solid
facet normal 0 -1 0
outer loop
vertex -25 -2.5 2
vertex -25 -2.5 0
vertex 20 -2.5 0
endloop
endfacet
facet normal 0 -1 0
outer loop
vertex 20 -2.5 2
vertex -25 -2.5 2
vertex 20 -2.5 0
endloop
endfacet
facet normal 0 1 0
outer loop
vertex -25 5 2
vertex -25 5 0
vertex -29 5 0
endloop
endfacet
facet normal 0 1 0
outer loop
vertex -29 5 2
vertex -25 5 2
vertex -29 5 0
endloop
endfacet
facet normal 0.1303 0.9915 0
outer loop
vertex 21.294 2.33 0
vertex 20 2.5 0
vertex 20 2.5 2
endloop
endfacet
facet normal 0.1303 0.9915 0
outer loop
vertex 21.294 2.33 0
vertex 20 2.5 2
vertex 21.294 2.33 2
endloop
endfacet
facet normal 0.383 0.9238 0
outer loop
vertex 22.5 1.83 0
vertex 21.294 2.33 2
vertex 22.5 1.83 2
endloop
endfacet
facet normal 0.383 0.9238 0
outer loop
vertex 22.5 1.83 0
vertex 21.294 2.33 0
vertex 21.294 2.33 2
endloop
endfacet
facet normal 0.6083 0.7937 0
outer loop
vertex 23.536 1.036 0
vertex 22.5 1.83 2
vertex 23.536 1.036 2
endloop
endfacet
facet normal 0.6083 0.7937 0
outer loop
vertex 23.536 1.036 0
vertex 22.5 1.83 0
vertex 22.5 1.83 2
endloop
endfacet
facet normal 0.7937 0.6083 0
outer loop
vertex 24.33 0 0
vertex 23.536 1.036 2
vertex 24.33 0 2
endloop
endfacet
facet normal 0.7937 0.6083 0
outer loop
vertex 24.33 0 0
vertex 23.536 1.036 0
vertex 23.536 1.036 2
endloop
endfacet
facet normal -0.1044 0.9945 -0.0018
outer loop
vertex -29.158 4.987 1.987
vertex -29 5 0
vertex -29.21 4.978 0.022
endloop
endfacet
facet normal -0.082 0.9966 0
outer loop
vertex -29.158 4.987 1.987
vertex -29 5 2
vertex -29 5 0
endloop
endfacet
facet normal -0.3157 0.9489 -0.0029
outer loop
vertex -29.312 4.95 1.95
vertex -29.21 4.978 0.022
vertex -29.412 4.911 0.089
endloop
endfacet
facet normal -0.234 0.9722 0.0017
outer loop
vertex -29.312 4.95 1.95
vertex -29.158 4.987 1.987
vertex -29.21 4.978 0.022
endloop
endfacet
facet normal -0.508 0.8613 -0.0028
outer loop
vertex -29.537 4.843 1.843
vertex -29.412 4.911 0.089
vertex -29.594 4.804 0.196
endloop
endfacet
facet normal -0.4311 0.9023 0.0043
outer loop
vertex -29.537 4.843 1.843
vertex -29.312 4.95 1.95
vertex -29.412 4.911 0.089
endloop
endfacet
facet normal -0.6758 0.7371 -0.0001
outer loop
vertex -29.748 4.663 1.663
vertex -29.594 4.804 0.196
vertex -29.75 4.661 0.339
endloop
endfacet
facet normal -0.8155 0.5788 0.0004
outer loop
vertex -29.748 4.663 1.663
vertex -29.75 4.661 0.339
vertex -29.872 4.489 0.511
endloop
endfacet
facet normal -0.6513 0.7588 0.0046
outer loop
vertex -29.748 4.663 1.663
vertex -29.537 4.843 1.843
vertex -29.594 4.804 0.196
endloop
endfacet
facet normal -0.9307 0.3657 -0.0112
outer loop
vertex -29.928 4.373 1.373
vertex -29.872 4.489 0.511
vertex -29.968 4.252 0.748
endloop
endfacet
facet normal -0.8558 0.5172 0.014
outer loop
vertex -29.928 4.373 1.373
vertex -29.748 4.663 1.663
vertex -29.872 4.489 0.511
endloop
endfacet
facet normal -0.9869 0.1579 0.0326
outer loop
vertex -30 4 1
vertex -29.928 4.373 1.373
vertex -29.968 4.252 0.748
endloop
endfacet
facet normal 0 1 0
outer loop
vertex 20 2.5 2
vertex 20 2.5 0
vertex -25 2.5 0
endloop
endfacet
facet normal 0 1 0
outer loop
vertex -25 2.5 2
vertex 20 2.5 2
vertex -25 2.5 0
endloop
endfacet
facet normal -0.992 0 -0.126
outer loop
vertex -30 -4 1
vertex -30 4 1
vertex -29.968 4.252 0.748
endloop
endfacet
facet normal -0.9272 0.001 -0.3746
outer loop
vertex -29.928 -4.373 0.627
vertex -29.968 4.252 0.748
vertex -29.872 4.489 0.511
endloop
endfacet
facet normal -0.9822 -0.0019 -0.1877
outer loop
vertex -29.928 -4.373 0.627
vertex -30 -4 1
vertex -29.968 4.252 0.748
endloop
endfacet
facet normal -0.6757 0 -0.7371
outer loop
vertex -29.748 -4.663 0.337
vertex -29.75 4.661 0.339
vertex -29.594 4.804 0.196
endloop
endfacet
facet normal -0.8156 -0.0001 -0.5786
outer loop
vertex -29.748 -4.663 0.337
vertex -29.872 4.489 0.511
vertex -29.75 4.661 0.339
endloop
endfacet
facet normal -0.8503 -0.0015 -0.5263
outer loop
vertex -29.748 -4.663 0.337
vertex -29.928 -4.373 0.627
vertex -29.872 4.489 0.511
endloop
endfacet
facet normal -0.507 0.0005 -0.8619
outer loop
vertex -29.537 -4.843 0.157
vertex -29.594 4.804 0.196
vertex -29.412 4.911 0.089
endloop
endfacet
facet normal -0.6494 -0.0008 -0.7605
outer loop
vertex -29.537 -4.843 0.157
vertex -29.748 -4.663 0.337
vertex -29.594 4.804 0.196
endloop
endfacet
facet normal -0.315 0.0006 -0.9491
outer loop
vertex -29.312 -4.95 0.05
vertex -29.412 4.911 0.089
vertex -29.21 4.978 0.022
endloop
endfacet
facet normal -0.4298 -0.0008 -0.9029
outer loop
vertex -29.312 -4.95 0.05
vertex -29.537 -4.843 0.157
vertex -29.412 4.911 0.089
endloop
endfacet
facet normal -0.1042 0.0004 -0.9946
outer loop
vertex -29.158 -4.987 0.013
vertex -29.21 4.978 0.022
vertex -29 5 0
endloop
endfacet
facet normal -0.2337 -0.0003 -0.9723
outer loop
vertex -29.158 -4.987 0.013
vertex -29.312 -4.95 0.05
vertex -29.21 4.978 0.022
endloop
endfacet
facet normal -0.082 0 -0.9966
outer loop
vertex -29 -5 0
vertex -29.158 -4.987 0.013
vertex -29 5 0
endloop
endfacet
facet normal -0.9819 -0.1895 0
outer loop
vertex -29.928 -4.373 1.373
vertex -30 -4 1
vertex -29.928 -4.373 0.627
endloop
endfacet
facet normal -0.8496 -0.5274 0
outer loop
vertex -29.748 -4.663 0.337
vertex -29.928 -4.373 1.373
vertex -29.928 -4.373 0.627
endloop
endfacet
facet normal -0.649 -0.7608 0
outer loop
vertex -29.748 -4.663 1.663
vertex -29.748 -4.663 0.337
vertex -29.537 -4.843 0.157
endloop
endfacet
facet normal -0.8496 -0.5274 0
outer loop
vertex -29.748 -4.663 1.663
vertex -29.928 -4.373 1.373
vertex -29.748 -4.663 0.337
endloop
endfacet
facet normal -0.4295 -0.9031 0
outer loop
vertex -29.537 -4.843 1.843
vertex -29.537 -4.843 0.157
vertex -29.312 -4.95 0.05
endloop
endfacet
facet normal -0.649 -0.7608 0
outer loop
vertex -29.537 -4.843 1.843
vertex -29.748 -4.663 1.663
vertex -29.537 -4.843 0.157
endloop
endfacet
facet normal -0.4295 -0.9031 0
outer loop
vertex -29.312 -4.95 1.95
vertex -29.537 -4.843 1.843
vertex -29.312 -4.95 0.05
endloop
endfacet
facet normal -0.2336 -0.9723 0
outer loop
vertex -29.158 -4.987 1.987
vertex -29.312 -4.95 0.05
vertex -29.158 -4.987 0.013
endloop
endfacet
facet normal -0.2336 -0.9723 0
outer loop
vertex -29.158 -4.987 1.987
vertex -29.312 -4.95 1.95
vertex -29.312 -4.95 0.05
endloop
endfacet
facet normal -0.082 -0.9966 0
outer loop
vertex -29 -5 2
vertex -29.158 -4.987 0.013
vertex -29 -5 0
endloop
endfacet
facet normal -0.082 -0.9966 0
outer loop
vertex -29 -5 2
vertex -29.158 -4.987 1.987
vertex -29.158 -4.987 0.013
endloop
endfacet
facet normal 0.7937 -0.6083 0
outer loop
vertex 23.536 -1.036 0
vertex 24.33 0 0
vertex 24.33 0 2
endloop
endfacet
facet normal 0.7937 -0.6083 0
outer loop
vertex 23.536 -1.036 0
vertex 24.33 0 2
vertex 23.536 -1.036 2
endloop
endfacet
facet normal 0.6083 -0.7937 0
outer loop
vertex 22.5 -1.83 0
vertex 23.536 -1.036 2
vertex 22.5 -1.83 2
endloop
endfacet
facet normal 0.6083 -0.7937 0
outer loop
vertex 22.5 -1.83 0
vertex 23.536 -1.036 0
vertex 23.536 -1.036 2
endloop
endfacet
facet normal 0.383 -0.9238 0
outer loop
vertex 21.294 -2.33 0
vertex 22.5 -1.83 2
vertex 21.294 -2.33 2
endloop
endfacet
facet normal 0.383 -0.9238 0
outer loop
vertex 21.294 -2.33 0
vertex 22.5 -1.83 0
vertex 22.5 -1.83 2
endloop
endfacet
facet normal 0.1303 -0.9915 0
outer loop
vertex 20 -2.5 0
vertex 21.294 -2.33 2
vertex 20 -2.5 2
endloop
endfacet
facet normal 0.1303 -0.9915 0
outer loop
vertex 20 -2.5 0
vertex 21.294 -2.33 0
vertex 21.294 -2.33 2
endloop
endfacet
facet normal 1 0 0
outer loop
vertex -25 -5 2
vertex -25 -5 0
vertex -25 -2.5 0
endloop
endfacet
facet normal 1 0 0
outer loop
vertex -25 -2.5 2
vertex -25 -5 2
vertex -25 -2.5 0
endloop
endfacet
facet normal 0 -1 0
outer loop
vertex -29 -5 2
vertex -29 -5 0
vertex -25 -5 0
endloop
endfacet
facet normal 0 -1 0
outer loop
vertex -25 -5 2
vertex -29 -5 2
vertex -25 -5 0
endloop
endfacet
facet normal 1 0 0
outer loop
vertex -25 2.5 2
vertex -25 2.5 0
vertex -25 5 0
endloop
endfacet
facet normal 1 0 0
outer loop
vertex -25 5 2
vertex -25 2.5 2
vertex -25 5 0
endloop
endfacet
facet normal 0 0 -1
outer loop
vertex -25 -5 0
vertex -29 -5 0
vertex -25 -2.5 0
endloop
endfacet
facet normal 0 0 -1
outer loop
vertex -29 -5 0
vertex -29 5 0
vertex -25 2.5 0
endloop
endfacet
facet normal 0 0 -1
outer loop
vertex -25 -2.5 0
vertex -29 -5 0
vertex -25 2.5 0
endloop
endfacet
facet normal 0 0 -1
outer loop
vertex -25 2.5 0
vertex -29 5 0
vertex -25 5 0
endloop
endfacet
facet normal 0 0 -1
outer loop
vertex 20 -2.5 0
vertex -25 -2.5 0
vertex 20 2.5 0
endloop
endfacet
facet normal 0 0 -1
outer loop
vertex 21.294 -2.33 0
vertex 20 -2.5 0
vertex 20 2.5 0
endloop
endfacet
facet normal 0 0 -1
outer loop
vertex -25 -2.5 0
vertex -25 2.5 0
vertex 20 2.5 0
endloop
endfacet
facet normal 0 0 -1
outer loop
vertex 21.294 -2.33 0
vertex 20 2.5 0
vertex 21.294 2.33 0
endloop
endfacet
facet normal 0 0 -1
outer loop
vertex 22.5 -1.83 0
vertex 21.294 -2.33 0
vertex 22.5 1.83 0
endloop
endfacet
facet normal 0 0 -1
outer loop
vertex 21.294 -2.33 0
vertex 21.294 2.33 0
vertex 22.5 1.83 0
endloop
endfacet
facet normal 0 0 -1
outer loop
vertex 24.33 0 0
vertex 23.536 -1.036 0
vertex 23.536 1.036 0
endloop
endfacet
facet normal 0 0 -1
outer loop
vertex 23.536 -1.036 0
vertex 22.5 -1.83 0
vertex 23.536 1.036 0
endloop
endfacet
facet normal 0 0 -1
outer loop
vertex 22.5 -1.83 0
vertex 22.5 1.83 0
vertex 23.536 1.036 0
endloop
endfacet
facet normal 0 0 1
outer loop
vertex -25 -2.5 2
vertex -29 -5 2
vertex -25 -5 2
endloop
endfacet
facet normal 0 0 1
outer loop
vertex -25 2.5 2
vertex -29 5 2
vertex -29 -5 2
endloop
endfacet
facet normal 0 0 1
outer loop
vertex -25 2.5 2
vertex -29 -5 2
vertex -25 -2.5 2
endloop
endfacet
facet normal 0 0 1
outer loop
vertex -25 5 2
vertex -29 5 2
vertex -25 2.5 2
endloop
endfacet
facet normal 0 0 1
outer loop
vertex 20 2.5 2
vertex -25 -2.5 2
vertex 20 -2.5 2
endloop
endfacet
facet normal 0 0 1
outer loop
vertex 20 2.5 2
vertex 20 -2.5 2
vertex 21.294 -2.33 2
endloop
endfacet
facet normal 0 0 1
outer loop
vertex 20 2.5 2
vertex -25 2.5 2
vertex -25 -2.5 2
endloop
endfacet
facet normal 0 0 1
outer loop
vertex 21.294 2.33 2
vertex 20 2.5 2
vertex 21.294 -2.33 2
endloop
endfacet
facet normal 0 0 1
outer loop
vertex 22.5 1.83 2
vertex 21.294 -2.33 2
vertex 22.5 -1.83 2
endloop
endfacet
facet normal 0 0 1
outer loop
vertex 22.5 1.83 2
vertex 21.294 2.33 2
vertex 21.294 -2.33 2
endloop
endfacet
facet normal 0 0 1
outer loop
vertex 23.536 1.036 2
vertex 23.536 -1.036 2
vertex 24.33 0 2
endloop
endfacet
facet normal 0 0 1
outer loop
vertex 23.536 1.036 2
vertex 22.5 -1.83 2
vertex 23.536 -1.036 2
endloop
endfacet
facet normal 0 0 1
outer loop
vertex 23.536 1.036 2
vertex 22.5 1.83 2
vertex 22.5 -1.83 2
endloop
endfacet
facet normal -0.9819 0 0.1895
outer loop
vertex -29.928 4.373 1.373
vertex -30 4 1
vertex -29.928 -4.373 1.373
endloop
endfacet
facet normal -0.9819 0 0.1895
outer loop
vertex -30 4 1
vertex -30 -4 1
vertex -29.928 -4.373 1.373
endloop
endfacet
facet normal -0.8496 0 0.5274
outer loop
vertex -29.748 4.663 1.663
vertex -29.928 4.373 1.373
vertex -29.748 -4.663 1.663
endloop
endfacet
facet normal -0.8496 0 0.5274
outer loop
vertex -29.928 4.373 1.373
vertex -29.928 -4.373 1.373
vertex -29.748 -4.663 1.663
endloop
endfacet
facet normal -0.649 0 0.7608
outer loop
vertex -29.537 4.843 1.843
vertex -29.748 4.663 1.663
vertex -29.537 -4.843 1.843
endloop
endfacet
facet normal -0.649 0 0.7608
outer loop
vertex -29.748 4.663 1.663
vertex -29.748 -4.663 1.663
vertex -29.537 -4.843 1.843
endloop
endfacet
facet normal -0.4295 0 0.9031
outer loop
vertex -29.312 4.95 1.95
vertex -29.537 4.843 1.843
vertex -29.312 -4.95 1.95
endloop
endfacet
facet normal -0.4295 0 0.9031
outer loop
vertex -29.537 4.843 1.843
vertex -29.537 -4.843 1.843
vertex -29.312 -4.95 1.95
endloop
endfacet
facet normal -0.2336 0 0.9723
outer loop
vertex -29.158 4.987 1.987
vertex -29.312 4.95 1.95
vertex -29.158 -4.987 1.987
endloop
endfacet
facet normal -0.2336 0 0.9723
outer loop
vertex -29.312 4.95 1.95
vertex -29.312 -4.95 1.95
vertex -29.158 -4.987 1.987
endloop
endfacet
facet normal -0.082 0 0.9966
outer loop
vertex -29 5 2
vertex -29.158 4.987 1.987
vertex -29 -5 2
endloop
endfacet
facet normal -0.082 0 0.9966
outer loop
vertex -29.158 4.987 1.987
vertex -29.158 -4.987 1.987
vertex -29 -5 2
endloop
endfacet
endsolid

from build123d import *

# Parameters (mm, degrees)
F1_DEPTH    = 2
F2_R        = 0.99999
F3_T1_DEPTH = 27


# Not quite as in the source:
# - a fillet or chamfer that OpenCascade refuses, or shapes differently, is made with other operations: its cross-section is extruded or revolved along the edge and cut away or added
# - a fillet or chamfer is up to 0.001 mm smaller than in the source, because OpenCascade refuses the exact size


with BuildPart() as f1:
    # F0 (on Top) → F1 (new body)
    with BuildSketch(Plane.XY):
        Polygon((-25, 0), (-25, 2.5), (-25, 5), (-30, 5), (-30, -5), (-25, -5), (-25, -2.5), align=None)
        Polygon((25, -2.5), (25, 2.5), (-25, 2.5), (-25, 0), (-25, -2.5), align=None)
    extrude(amount=F1_DEPTH)

    # F2 (radius 1 in the source; OpenCascade refuses exactly that, so slightly less here)
    f2_edges = [f1.edges().sort_by_distance(p)[0] for p in [
        (-30, -5, 1),
        (-30, 0, 2),
        (-30, 5, 1),
        (-30, 0, 0),
    ]]
    fillet(f2_edges, radius=F2_R)

    # F3: fillet of radius 5 on 2 edges, made by hand

    # F3_s2 → F3_t1 (cut)
    with BuildSketch(Plane.XY.offset(-12.5)):
        with BuildLine():
            ThreePointArc((25, 2.5), (23.5355339059, -1.0355339059), (20, -2.5))
            Line((20, -2.5), (25, -2.5))
            Line((25, -2.5), (25, 2.5))
        make_face()
        with BuildLine():
            ThreePointArc((20, 2.5), (23.5355339059, 1.0355339059), (25, -2.5))
            Line((25, -2.5), (25, 2.5))
            Line((25, 2.5), (20, 2.5))
        make_face()
    extrude(amount=F3_T1_DEPTH, mode=Mode.SUBTRACT)


solid = f1.part
